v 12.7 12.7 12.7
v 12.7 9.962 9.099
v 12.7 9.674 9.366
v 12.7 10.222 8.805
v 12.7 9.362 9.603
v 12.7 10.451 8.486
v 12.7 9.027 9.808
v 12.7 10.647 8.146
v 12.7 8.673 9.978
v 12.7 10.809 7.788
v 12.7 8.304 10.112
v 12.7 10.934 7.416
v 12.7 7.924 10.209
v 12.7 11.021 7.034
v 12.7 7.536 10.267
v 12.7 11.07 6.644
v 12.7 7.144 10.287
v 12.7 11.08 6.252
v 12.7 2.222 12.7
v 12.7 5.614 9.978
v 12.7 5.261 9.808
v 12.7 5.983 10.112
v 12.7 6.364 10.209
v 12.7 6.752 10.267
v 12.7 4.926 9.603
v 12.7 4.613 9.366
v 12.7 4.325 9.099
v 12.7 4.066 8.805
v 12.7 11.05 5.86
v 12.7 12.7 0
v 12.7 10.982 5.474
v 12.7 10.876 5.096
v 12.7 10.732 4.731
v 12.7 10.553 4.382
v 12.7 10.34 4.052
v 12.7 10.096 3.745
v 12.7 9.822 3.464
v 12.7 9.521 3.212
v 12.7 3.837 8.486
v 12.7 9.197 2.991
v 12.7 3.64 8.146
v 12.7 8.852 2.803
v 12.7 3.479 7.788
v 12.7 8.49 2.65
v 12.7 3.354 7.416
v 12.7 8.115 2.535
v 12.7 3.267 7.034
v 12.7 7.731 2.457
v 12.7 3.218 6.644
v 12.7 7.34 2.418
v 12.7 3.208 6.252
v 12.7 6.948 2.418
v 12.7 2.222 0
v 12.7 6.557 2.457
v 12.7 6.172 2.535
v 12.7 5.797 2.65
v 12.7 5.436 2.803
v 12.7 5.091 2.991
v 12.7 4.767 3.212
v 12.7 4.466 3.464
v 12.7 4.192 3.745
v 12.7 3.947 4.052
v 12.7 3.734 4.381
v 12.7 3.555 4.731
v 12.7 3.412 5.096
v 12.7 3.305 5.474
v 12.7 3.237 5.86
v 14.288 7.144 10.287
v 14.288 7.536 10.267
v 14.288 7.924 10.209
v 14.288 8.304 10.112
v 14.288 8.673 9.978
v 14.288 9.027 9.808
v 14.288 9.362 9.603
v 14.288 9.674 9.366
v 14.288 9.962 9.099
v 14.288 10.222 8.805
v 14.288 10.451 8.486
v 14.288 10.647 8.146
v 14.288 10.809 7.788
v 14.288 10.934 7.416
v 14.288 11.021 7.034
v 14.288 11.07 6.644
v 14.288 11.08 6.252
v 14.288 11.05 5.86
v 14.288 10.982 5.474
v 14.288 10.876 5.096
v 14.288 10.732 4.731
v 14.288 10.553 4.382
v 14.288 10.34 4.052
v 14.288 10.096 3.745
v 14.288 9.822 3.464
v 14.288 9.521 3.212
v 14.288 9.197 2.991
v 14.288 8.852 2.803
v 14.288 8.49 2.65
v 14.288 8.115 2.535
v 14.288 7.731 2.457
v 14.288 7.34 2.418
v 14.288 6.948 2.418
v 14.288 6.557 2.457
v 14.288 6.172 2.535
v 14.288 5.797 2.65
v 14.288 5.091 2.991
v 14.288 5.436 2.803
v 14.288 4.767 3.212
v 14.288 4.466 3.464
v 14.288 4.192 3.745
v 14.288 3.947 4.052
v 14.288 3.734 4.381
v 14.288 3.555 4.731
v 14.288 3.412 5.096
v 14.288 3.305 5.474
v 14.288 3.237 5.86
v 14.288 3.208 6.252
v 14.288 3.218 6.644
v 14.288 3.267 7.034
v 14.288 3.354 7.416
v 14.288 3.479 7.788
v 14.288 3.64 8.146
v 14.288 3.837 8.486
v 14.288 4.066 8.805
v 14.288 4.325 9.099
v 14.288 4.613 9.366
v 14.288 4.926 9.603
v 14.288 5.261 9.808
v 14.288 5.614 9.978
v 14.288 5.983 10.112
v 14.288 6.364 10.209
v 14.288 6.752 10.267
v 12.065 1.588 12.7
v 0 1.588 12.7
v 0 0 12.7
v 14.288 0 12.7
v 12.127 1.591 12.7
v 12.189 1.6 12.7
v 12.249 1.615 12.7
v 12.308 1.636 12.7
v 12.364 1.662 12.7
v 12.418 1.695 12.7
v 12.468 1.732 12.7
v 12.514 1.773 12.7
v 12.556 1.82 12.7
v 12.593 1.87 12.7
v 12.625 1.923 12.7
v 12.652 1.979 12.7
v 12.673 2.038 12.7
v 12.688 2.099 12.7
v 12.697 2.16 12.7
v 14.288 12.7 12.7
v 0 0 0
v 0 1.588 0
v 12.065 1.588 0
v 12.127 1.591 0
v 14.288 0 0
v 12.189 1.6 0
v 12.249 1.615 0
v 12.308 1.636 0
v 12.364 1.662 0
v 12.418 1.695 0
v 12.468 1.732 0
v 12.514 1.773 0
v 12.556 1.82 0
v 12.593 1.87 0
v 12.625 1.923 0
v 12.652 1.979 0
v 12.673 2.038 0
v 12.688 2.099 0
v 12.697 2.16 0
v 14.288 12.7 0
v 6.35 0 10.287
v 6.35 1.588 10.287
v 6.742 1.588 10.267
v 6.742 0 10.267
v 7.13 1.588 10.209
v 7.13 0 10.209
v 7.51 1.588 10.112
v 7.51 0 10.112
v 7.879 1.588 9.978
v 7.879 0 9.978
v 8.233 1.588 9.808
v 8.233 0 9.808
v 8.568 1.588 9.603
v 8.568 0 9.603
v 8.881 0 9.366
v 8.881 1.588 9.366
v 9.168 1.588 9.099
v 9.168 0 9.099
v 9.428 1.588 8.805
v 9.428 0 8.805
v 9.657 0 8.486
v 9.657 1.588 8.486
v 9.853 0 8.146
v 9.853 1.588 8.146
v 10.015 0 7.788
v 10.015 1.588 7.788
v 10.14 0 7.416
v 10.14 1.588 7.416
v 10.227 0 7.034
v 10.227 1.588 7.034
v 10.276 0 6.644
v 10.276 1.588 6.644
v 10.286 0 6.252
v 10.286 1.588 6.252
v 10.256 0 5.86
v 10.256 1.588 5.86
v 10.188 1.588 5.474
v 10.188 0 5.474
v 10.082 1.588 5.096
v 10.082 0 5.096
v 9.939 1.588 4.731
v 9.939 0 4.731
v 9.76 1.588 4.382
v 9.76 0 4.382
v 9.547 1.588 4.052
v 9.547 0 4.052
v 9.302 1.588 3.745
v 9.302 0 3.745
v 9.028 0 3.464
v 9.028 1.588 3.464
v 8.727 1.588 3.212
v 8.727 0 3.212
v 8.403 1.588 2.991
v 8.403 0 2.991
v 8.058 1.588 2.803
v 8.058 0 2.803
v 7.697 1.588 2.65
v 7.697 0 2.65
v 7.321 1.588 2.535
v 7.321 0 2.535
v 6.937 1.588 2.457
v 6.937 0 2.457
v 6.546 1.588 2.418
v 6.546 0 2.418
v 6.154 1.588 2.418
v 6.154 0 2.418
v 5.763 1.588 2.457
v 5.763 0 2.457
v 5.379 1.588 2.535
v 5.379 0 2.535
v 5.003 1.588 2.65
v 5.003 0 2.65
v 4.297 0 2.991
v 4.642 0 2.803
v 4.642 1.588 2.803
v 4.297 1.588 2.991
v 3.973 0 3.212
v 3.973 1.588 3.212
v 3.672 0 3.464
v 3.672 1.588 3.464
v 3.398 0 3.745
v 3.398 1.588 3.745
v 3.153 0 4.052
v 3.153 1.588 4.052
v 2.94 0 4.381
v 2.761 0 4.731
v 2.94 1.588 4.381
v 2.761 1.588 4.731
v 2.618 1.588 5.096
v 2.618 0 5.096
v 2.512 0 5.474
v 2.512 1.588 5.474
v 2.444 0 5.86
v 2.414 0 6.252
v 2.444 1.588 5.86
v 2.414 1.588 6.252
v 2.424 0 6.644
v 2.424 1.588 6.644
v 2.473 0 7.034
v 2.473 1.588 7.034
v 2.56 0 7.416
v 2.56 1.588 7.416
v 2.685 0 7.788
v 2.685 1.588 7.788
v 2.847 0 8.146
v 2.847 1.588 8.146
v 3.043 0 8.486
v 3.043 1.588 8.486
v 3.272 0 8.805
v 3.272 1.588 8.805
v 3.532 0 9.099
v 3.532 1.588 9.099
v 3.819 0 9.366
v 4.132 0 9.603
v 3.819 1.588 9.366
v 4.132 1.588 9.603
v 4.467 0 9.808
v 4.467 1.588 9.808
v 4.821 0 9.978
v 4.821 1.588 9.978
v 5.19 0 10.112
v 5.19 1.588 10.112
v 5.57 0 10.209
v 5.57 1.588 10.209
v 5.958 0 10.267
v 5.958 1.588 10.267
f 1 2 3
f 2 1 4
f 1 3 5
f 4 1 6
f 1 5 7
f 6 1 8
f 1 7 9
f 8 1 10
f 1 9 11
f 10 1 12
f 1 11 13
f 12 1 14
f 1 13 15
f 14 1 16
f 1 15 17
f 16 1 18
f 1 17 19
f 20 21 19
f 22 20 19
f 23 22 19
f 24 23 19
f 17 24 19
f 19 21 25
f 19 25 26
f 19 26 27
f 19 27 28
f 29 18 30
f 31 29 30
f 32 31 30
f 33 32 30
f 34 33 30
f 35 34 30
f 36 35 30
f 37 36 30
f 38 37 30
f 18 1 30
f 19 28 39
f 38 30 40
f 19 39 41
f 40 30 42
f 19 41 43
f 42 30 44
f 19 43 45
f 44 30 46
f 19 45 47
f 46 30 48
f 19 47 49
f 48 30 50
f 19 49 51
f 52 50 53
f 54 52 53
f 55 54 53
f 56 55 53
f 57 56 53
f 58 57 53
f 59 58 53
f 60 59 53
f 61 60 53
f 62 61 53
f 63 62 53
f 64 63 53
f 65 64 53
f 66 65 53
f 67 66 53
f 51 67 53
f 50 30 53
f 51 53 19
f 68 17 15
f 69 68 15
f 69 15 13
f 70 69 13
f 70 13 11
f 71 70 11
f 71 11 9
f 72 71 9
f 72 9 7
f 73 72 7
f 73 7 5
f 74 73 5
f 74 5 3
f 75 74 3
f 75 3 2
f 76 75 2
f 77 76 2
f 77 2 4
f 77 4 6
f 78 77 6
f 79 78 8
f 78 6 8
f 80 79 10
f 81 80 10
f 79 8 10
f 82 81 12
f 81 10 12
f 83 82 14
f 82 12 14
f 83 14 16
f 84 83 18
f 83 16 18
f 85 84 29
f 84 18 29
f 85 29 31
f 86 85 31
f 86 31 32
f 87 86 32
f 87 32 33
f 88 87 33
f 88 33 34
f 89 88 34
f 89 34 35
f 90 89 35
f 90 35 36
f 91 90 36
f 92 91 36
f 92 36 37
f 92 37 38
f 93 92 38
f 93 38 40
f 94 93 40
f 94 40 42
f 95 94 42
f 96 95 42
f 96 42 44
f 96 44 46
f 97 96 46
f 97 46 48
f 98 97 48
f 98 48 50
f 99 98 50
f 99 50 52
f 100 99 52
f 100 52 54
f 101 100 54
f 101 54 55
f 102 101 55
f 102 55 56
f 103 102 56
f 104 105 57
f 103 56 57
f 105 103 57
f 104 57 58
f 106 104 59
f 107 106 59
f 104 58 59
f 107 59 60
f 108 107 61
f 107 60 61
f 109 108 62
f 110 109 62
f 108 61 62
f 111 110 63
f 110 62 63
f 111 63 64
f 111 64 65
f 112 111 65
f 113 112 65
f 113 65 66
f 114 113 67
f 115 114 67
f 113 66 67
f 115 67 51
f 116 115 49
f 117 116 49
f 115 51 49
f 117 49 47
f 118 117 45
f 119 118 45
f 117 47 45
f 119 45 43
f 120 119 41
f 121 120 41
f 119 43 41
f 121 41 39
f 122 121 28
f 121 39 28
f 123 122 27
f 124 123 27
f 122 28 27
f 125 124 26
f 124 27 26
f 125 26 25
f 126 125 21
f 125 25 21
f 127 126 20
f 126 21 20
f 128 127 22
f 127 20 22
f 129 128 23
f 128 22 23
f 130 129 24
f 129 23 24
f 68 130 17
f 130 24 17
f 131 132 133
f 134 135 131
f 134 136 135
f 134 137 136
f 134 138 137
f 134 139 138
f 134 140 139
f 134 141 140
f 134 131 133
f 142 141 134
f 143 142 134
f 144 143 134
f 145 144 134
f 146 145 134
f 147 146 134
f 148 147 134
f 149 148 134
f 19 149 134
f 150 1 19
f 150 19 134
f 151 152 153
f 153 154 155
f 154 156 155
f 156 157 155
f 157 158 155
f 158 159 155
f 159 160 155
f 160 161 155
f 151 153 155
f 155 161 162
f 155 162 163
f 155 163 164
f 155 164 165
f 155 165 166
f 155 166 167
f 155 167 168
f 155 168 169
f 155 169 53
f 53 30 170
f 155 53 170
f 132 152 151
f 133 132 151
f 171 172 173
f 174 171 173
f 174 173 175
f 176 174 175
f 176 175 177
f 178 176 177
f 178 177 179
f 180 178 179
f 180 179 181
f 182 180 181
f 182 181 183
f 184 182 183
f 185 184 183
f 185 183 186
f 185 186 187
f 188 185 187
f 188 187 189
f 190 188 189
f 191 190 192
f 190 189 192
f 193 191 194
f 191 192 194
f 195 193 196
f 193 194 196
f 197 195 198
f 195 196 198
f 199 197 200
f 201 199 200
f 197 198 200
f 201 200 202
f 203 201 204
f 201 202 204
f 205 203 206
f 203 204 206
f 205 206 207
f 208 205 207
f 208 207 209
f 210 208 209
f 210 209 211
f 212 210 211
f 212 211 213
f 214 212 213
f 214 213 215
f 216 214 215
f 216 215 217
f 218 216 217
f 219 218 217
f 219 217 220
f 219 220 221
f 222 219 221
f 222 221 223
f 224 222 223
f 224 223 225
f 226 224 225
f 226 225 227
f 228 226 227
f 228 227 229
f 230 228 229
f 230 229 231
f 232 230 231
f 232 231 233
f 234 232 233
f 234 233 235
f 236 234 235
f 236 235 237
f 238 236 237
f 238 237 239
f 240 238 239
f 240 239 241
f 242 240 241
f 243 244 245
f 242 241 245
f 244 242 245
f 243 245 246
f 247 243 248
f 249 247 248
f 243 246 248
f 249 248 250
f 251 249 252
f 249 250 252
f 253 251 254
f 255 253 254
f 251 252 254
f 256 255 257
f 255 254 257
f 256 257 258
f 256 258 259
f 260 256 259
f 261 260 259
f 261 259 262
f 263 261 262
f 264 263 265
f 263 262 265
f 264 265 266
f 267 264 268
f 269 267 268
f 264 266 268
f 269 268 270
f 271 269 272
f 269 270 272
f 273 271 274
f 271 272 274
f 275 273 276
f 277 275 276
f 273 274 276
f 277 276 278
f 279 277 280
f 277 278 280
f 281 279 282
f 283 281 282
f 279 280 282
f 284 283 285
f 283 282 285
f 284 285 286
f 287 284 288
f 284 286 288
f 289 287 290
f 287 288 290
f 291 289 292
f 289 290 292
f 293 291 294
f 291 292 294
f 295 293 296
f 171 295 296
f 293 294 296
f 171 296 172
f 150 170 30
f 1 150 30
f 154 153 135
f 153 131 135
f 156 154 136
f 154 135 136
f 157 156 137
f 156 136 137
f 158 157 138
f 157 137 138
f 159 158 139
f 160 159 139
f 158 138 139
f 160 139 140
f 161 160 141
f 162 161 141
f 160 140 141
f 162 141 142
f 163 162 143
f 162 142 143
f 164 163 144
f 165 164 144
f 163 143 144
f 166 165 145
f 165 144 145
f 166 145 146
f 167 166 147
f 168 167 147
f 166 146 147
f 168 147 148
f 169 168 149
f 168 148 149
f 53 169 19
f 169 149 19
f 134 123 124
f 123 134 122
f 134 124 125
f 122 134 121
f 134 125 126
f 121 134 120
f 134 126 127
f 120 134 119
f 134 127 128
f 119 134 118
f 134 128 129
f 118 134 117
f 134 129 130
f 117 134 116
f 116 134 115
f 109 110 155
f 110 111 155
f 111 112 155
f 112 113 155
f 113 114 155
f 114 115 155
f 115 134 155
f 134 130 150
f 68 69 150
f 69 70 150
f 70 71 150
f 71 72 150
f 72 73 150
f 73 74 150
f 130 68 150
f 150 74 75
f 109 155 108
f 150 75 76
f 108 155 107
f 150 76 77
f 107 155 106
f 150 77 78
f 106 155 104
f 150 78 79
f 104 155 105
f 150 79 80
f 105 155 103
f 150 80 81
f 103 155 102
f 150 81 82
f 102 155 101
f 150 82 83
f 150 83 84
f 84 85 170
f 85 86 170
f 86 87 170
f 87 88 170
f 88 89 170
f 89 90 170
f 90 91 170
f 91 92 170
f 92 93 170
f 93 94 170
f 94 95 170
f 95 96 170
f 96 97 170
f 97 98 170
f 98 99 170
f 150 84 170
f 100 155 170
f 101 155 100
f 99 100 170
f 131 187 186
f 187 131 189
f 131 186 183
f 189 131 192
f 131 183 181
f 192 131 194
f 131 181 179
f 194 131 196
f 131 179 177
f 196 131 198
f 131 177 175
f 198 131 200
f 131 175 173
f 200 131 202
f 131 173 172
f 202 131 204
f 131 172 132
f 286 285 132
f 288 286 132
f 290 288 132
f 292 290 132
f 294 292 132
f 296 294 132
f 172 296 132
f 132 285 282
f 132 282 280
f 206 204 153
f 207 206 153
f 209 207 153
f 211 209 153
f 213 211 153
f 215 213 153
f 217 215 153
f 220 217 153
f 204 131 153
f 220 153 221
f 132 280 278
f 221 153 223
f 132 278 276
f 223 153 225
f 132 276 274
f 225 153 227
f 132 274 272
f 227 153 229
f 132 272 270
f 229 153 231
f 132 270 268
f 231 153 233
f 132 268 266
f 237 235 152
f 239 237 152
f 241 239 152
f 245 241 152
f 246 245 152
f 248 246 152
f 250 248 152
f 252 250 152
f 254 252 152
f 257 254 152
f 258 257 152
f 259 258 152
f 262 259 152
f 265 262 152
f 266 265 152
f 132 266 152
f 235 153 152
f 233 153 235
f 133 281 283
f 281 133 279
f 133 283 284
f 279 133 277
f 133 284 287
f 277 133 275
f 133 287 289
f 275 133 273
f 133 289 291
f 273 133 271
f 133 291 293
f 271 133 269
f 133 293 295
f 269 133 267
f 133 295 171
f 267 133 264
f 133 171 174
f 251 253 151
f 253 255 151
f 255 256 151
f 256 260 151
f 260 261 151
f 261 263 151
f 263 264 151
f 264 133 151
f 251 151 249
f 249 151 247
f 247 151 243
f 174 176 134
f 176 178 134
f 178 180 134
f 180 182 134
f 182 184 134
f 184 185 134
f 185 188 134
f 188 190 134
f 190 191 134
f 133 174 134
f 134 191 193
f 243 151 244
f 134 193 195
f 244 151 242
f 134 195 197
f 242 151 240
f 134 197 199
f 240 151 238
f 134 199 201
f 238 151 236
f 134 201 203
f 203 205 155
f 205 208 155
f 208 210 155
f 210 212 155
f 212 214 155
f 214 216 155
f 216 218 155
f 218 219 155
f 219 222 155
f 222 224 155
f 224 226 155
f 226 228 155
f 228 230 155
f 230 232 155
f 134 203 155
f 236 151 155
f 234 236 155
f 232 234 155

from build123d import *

# Parameters (mm, degrees)
BOSS_EXTRUDE1_DEPTH = 12.7
SKETCH2_R           = 3.937
CUT_EXTRUDE1_DEPTH  = 6.35
SKETCH4_R           = 3.937
CUT_EXTRUDE2_DEPTH  = 6.35
FILLET2_R           = 0.635


with BuildPart() as part:
    # Sketch1 → Boss-Extrude1 (new body)
    with BuildSketch(Plane.XY):
        Polygon((0, 0), (14.2875, 0), (14.2875, 12.7), (12.7, 12.7), (12.7, 1.5875), (0, 1.5875), align=None)
    extrude(amount=BOSS_EXTRUDE1_DEPTH)

    # Sketch2 → Cut-Extrude1 (cut)
    with BuildSketch(Plane.ZY.offset(-12.7)):
        with Locations((6.35, 7.14375)):
            Circle(SKETCH2_R)
    extrude(amount=-CUT_EXTRUDE1_DEPTH, mode=Mode.SUBTRACT)

    # Sketch4 → Cut-Extrude2 (cut)
    with BuildSketch(Plane(origin=(0, 1.5875, 0), x_dir=(1, 0, 0), z_dir=(0, 1, 0))):
        with Locations(Location((6.35, -6.35, 0), (0, 0, 270))):
            Circle(SKETCH4_R)
    extrude(amount=-CUT_EXTRUDE2_DEPTH, mode=Mode.SUBTRACT)

    # Fillet2
    fillet2_edges = [part.edges().sort_by_distance(p)[0] for p in [
        (12.7, 1.5875, 6.35),
    ]]
    fillet(fillet2_edges, radius=FILLET2_R)


solid = part.part
